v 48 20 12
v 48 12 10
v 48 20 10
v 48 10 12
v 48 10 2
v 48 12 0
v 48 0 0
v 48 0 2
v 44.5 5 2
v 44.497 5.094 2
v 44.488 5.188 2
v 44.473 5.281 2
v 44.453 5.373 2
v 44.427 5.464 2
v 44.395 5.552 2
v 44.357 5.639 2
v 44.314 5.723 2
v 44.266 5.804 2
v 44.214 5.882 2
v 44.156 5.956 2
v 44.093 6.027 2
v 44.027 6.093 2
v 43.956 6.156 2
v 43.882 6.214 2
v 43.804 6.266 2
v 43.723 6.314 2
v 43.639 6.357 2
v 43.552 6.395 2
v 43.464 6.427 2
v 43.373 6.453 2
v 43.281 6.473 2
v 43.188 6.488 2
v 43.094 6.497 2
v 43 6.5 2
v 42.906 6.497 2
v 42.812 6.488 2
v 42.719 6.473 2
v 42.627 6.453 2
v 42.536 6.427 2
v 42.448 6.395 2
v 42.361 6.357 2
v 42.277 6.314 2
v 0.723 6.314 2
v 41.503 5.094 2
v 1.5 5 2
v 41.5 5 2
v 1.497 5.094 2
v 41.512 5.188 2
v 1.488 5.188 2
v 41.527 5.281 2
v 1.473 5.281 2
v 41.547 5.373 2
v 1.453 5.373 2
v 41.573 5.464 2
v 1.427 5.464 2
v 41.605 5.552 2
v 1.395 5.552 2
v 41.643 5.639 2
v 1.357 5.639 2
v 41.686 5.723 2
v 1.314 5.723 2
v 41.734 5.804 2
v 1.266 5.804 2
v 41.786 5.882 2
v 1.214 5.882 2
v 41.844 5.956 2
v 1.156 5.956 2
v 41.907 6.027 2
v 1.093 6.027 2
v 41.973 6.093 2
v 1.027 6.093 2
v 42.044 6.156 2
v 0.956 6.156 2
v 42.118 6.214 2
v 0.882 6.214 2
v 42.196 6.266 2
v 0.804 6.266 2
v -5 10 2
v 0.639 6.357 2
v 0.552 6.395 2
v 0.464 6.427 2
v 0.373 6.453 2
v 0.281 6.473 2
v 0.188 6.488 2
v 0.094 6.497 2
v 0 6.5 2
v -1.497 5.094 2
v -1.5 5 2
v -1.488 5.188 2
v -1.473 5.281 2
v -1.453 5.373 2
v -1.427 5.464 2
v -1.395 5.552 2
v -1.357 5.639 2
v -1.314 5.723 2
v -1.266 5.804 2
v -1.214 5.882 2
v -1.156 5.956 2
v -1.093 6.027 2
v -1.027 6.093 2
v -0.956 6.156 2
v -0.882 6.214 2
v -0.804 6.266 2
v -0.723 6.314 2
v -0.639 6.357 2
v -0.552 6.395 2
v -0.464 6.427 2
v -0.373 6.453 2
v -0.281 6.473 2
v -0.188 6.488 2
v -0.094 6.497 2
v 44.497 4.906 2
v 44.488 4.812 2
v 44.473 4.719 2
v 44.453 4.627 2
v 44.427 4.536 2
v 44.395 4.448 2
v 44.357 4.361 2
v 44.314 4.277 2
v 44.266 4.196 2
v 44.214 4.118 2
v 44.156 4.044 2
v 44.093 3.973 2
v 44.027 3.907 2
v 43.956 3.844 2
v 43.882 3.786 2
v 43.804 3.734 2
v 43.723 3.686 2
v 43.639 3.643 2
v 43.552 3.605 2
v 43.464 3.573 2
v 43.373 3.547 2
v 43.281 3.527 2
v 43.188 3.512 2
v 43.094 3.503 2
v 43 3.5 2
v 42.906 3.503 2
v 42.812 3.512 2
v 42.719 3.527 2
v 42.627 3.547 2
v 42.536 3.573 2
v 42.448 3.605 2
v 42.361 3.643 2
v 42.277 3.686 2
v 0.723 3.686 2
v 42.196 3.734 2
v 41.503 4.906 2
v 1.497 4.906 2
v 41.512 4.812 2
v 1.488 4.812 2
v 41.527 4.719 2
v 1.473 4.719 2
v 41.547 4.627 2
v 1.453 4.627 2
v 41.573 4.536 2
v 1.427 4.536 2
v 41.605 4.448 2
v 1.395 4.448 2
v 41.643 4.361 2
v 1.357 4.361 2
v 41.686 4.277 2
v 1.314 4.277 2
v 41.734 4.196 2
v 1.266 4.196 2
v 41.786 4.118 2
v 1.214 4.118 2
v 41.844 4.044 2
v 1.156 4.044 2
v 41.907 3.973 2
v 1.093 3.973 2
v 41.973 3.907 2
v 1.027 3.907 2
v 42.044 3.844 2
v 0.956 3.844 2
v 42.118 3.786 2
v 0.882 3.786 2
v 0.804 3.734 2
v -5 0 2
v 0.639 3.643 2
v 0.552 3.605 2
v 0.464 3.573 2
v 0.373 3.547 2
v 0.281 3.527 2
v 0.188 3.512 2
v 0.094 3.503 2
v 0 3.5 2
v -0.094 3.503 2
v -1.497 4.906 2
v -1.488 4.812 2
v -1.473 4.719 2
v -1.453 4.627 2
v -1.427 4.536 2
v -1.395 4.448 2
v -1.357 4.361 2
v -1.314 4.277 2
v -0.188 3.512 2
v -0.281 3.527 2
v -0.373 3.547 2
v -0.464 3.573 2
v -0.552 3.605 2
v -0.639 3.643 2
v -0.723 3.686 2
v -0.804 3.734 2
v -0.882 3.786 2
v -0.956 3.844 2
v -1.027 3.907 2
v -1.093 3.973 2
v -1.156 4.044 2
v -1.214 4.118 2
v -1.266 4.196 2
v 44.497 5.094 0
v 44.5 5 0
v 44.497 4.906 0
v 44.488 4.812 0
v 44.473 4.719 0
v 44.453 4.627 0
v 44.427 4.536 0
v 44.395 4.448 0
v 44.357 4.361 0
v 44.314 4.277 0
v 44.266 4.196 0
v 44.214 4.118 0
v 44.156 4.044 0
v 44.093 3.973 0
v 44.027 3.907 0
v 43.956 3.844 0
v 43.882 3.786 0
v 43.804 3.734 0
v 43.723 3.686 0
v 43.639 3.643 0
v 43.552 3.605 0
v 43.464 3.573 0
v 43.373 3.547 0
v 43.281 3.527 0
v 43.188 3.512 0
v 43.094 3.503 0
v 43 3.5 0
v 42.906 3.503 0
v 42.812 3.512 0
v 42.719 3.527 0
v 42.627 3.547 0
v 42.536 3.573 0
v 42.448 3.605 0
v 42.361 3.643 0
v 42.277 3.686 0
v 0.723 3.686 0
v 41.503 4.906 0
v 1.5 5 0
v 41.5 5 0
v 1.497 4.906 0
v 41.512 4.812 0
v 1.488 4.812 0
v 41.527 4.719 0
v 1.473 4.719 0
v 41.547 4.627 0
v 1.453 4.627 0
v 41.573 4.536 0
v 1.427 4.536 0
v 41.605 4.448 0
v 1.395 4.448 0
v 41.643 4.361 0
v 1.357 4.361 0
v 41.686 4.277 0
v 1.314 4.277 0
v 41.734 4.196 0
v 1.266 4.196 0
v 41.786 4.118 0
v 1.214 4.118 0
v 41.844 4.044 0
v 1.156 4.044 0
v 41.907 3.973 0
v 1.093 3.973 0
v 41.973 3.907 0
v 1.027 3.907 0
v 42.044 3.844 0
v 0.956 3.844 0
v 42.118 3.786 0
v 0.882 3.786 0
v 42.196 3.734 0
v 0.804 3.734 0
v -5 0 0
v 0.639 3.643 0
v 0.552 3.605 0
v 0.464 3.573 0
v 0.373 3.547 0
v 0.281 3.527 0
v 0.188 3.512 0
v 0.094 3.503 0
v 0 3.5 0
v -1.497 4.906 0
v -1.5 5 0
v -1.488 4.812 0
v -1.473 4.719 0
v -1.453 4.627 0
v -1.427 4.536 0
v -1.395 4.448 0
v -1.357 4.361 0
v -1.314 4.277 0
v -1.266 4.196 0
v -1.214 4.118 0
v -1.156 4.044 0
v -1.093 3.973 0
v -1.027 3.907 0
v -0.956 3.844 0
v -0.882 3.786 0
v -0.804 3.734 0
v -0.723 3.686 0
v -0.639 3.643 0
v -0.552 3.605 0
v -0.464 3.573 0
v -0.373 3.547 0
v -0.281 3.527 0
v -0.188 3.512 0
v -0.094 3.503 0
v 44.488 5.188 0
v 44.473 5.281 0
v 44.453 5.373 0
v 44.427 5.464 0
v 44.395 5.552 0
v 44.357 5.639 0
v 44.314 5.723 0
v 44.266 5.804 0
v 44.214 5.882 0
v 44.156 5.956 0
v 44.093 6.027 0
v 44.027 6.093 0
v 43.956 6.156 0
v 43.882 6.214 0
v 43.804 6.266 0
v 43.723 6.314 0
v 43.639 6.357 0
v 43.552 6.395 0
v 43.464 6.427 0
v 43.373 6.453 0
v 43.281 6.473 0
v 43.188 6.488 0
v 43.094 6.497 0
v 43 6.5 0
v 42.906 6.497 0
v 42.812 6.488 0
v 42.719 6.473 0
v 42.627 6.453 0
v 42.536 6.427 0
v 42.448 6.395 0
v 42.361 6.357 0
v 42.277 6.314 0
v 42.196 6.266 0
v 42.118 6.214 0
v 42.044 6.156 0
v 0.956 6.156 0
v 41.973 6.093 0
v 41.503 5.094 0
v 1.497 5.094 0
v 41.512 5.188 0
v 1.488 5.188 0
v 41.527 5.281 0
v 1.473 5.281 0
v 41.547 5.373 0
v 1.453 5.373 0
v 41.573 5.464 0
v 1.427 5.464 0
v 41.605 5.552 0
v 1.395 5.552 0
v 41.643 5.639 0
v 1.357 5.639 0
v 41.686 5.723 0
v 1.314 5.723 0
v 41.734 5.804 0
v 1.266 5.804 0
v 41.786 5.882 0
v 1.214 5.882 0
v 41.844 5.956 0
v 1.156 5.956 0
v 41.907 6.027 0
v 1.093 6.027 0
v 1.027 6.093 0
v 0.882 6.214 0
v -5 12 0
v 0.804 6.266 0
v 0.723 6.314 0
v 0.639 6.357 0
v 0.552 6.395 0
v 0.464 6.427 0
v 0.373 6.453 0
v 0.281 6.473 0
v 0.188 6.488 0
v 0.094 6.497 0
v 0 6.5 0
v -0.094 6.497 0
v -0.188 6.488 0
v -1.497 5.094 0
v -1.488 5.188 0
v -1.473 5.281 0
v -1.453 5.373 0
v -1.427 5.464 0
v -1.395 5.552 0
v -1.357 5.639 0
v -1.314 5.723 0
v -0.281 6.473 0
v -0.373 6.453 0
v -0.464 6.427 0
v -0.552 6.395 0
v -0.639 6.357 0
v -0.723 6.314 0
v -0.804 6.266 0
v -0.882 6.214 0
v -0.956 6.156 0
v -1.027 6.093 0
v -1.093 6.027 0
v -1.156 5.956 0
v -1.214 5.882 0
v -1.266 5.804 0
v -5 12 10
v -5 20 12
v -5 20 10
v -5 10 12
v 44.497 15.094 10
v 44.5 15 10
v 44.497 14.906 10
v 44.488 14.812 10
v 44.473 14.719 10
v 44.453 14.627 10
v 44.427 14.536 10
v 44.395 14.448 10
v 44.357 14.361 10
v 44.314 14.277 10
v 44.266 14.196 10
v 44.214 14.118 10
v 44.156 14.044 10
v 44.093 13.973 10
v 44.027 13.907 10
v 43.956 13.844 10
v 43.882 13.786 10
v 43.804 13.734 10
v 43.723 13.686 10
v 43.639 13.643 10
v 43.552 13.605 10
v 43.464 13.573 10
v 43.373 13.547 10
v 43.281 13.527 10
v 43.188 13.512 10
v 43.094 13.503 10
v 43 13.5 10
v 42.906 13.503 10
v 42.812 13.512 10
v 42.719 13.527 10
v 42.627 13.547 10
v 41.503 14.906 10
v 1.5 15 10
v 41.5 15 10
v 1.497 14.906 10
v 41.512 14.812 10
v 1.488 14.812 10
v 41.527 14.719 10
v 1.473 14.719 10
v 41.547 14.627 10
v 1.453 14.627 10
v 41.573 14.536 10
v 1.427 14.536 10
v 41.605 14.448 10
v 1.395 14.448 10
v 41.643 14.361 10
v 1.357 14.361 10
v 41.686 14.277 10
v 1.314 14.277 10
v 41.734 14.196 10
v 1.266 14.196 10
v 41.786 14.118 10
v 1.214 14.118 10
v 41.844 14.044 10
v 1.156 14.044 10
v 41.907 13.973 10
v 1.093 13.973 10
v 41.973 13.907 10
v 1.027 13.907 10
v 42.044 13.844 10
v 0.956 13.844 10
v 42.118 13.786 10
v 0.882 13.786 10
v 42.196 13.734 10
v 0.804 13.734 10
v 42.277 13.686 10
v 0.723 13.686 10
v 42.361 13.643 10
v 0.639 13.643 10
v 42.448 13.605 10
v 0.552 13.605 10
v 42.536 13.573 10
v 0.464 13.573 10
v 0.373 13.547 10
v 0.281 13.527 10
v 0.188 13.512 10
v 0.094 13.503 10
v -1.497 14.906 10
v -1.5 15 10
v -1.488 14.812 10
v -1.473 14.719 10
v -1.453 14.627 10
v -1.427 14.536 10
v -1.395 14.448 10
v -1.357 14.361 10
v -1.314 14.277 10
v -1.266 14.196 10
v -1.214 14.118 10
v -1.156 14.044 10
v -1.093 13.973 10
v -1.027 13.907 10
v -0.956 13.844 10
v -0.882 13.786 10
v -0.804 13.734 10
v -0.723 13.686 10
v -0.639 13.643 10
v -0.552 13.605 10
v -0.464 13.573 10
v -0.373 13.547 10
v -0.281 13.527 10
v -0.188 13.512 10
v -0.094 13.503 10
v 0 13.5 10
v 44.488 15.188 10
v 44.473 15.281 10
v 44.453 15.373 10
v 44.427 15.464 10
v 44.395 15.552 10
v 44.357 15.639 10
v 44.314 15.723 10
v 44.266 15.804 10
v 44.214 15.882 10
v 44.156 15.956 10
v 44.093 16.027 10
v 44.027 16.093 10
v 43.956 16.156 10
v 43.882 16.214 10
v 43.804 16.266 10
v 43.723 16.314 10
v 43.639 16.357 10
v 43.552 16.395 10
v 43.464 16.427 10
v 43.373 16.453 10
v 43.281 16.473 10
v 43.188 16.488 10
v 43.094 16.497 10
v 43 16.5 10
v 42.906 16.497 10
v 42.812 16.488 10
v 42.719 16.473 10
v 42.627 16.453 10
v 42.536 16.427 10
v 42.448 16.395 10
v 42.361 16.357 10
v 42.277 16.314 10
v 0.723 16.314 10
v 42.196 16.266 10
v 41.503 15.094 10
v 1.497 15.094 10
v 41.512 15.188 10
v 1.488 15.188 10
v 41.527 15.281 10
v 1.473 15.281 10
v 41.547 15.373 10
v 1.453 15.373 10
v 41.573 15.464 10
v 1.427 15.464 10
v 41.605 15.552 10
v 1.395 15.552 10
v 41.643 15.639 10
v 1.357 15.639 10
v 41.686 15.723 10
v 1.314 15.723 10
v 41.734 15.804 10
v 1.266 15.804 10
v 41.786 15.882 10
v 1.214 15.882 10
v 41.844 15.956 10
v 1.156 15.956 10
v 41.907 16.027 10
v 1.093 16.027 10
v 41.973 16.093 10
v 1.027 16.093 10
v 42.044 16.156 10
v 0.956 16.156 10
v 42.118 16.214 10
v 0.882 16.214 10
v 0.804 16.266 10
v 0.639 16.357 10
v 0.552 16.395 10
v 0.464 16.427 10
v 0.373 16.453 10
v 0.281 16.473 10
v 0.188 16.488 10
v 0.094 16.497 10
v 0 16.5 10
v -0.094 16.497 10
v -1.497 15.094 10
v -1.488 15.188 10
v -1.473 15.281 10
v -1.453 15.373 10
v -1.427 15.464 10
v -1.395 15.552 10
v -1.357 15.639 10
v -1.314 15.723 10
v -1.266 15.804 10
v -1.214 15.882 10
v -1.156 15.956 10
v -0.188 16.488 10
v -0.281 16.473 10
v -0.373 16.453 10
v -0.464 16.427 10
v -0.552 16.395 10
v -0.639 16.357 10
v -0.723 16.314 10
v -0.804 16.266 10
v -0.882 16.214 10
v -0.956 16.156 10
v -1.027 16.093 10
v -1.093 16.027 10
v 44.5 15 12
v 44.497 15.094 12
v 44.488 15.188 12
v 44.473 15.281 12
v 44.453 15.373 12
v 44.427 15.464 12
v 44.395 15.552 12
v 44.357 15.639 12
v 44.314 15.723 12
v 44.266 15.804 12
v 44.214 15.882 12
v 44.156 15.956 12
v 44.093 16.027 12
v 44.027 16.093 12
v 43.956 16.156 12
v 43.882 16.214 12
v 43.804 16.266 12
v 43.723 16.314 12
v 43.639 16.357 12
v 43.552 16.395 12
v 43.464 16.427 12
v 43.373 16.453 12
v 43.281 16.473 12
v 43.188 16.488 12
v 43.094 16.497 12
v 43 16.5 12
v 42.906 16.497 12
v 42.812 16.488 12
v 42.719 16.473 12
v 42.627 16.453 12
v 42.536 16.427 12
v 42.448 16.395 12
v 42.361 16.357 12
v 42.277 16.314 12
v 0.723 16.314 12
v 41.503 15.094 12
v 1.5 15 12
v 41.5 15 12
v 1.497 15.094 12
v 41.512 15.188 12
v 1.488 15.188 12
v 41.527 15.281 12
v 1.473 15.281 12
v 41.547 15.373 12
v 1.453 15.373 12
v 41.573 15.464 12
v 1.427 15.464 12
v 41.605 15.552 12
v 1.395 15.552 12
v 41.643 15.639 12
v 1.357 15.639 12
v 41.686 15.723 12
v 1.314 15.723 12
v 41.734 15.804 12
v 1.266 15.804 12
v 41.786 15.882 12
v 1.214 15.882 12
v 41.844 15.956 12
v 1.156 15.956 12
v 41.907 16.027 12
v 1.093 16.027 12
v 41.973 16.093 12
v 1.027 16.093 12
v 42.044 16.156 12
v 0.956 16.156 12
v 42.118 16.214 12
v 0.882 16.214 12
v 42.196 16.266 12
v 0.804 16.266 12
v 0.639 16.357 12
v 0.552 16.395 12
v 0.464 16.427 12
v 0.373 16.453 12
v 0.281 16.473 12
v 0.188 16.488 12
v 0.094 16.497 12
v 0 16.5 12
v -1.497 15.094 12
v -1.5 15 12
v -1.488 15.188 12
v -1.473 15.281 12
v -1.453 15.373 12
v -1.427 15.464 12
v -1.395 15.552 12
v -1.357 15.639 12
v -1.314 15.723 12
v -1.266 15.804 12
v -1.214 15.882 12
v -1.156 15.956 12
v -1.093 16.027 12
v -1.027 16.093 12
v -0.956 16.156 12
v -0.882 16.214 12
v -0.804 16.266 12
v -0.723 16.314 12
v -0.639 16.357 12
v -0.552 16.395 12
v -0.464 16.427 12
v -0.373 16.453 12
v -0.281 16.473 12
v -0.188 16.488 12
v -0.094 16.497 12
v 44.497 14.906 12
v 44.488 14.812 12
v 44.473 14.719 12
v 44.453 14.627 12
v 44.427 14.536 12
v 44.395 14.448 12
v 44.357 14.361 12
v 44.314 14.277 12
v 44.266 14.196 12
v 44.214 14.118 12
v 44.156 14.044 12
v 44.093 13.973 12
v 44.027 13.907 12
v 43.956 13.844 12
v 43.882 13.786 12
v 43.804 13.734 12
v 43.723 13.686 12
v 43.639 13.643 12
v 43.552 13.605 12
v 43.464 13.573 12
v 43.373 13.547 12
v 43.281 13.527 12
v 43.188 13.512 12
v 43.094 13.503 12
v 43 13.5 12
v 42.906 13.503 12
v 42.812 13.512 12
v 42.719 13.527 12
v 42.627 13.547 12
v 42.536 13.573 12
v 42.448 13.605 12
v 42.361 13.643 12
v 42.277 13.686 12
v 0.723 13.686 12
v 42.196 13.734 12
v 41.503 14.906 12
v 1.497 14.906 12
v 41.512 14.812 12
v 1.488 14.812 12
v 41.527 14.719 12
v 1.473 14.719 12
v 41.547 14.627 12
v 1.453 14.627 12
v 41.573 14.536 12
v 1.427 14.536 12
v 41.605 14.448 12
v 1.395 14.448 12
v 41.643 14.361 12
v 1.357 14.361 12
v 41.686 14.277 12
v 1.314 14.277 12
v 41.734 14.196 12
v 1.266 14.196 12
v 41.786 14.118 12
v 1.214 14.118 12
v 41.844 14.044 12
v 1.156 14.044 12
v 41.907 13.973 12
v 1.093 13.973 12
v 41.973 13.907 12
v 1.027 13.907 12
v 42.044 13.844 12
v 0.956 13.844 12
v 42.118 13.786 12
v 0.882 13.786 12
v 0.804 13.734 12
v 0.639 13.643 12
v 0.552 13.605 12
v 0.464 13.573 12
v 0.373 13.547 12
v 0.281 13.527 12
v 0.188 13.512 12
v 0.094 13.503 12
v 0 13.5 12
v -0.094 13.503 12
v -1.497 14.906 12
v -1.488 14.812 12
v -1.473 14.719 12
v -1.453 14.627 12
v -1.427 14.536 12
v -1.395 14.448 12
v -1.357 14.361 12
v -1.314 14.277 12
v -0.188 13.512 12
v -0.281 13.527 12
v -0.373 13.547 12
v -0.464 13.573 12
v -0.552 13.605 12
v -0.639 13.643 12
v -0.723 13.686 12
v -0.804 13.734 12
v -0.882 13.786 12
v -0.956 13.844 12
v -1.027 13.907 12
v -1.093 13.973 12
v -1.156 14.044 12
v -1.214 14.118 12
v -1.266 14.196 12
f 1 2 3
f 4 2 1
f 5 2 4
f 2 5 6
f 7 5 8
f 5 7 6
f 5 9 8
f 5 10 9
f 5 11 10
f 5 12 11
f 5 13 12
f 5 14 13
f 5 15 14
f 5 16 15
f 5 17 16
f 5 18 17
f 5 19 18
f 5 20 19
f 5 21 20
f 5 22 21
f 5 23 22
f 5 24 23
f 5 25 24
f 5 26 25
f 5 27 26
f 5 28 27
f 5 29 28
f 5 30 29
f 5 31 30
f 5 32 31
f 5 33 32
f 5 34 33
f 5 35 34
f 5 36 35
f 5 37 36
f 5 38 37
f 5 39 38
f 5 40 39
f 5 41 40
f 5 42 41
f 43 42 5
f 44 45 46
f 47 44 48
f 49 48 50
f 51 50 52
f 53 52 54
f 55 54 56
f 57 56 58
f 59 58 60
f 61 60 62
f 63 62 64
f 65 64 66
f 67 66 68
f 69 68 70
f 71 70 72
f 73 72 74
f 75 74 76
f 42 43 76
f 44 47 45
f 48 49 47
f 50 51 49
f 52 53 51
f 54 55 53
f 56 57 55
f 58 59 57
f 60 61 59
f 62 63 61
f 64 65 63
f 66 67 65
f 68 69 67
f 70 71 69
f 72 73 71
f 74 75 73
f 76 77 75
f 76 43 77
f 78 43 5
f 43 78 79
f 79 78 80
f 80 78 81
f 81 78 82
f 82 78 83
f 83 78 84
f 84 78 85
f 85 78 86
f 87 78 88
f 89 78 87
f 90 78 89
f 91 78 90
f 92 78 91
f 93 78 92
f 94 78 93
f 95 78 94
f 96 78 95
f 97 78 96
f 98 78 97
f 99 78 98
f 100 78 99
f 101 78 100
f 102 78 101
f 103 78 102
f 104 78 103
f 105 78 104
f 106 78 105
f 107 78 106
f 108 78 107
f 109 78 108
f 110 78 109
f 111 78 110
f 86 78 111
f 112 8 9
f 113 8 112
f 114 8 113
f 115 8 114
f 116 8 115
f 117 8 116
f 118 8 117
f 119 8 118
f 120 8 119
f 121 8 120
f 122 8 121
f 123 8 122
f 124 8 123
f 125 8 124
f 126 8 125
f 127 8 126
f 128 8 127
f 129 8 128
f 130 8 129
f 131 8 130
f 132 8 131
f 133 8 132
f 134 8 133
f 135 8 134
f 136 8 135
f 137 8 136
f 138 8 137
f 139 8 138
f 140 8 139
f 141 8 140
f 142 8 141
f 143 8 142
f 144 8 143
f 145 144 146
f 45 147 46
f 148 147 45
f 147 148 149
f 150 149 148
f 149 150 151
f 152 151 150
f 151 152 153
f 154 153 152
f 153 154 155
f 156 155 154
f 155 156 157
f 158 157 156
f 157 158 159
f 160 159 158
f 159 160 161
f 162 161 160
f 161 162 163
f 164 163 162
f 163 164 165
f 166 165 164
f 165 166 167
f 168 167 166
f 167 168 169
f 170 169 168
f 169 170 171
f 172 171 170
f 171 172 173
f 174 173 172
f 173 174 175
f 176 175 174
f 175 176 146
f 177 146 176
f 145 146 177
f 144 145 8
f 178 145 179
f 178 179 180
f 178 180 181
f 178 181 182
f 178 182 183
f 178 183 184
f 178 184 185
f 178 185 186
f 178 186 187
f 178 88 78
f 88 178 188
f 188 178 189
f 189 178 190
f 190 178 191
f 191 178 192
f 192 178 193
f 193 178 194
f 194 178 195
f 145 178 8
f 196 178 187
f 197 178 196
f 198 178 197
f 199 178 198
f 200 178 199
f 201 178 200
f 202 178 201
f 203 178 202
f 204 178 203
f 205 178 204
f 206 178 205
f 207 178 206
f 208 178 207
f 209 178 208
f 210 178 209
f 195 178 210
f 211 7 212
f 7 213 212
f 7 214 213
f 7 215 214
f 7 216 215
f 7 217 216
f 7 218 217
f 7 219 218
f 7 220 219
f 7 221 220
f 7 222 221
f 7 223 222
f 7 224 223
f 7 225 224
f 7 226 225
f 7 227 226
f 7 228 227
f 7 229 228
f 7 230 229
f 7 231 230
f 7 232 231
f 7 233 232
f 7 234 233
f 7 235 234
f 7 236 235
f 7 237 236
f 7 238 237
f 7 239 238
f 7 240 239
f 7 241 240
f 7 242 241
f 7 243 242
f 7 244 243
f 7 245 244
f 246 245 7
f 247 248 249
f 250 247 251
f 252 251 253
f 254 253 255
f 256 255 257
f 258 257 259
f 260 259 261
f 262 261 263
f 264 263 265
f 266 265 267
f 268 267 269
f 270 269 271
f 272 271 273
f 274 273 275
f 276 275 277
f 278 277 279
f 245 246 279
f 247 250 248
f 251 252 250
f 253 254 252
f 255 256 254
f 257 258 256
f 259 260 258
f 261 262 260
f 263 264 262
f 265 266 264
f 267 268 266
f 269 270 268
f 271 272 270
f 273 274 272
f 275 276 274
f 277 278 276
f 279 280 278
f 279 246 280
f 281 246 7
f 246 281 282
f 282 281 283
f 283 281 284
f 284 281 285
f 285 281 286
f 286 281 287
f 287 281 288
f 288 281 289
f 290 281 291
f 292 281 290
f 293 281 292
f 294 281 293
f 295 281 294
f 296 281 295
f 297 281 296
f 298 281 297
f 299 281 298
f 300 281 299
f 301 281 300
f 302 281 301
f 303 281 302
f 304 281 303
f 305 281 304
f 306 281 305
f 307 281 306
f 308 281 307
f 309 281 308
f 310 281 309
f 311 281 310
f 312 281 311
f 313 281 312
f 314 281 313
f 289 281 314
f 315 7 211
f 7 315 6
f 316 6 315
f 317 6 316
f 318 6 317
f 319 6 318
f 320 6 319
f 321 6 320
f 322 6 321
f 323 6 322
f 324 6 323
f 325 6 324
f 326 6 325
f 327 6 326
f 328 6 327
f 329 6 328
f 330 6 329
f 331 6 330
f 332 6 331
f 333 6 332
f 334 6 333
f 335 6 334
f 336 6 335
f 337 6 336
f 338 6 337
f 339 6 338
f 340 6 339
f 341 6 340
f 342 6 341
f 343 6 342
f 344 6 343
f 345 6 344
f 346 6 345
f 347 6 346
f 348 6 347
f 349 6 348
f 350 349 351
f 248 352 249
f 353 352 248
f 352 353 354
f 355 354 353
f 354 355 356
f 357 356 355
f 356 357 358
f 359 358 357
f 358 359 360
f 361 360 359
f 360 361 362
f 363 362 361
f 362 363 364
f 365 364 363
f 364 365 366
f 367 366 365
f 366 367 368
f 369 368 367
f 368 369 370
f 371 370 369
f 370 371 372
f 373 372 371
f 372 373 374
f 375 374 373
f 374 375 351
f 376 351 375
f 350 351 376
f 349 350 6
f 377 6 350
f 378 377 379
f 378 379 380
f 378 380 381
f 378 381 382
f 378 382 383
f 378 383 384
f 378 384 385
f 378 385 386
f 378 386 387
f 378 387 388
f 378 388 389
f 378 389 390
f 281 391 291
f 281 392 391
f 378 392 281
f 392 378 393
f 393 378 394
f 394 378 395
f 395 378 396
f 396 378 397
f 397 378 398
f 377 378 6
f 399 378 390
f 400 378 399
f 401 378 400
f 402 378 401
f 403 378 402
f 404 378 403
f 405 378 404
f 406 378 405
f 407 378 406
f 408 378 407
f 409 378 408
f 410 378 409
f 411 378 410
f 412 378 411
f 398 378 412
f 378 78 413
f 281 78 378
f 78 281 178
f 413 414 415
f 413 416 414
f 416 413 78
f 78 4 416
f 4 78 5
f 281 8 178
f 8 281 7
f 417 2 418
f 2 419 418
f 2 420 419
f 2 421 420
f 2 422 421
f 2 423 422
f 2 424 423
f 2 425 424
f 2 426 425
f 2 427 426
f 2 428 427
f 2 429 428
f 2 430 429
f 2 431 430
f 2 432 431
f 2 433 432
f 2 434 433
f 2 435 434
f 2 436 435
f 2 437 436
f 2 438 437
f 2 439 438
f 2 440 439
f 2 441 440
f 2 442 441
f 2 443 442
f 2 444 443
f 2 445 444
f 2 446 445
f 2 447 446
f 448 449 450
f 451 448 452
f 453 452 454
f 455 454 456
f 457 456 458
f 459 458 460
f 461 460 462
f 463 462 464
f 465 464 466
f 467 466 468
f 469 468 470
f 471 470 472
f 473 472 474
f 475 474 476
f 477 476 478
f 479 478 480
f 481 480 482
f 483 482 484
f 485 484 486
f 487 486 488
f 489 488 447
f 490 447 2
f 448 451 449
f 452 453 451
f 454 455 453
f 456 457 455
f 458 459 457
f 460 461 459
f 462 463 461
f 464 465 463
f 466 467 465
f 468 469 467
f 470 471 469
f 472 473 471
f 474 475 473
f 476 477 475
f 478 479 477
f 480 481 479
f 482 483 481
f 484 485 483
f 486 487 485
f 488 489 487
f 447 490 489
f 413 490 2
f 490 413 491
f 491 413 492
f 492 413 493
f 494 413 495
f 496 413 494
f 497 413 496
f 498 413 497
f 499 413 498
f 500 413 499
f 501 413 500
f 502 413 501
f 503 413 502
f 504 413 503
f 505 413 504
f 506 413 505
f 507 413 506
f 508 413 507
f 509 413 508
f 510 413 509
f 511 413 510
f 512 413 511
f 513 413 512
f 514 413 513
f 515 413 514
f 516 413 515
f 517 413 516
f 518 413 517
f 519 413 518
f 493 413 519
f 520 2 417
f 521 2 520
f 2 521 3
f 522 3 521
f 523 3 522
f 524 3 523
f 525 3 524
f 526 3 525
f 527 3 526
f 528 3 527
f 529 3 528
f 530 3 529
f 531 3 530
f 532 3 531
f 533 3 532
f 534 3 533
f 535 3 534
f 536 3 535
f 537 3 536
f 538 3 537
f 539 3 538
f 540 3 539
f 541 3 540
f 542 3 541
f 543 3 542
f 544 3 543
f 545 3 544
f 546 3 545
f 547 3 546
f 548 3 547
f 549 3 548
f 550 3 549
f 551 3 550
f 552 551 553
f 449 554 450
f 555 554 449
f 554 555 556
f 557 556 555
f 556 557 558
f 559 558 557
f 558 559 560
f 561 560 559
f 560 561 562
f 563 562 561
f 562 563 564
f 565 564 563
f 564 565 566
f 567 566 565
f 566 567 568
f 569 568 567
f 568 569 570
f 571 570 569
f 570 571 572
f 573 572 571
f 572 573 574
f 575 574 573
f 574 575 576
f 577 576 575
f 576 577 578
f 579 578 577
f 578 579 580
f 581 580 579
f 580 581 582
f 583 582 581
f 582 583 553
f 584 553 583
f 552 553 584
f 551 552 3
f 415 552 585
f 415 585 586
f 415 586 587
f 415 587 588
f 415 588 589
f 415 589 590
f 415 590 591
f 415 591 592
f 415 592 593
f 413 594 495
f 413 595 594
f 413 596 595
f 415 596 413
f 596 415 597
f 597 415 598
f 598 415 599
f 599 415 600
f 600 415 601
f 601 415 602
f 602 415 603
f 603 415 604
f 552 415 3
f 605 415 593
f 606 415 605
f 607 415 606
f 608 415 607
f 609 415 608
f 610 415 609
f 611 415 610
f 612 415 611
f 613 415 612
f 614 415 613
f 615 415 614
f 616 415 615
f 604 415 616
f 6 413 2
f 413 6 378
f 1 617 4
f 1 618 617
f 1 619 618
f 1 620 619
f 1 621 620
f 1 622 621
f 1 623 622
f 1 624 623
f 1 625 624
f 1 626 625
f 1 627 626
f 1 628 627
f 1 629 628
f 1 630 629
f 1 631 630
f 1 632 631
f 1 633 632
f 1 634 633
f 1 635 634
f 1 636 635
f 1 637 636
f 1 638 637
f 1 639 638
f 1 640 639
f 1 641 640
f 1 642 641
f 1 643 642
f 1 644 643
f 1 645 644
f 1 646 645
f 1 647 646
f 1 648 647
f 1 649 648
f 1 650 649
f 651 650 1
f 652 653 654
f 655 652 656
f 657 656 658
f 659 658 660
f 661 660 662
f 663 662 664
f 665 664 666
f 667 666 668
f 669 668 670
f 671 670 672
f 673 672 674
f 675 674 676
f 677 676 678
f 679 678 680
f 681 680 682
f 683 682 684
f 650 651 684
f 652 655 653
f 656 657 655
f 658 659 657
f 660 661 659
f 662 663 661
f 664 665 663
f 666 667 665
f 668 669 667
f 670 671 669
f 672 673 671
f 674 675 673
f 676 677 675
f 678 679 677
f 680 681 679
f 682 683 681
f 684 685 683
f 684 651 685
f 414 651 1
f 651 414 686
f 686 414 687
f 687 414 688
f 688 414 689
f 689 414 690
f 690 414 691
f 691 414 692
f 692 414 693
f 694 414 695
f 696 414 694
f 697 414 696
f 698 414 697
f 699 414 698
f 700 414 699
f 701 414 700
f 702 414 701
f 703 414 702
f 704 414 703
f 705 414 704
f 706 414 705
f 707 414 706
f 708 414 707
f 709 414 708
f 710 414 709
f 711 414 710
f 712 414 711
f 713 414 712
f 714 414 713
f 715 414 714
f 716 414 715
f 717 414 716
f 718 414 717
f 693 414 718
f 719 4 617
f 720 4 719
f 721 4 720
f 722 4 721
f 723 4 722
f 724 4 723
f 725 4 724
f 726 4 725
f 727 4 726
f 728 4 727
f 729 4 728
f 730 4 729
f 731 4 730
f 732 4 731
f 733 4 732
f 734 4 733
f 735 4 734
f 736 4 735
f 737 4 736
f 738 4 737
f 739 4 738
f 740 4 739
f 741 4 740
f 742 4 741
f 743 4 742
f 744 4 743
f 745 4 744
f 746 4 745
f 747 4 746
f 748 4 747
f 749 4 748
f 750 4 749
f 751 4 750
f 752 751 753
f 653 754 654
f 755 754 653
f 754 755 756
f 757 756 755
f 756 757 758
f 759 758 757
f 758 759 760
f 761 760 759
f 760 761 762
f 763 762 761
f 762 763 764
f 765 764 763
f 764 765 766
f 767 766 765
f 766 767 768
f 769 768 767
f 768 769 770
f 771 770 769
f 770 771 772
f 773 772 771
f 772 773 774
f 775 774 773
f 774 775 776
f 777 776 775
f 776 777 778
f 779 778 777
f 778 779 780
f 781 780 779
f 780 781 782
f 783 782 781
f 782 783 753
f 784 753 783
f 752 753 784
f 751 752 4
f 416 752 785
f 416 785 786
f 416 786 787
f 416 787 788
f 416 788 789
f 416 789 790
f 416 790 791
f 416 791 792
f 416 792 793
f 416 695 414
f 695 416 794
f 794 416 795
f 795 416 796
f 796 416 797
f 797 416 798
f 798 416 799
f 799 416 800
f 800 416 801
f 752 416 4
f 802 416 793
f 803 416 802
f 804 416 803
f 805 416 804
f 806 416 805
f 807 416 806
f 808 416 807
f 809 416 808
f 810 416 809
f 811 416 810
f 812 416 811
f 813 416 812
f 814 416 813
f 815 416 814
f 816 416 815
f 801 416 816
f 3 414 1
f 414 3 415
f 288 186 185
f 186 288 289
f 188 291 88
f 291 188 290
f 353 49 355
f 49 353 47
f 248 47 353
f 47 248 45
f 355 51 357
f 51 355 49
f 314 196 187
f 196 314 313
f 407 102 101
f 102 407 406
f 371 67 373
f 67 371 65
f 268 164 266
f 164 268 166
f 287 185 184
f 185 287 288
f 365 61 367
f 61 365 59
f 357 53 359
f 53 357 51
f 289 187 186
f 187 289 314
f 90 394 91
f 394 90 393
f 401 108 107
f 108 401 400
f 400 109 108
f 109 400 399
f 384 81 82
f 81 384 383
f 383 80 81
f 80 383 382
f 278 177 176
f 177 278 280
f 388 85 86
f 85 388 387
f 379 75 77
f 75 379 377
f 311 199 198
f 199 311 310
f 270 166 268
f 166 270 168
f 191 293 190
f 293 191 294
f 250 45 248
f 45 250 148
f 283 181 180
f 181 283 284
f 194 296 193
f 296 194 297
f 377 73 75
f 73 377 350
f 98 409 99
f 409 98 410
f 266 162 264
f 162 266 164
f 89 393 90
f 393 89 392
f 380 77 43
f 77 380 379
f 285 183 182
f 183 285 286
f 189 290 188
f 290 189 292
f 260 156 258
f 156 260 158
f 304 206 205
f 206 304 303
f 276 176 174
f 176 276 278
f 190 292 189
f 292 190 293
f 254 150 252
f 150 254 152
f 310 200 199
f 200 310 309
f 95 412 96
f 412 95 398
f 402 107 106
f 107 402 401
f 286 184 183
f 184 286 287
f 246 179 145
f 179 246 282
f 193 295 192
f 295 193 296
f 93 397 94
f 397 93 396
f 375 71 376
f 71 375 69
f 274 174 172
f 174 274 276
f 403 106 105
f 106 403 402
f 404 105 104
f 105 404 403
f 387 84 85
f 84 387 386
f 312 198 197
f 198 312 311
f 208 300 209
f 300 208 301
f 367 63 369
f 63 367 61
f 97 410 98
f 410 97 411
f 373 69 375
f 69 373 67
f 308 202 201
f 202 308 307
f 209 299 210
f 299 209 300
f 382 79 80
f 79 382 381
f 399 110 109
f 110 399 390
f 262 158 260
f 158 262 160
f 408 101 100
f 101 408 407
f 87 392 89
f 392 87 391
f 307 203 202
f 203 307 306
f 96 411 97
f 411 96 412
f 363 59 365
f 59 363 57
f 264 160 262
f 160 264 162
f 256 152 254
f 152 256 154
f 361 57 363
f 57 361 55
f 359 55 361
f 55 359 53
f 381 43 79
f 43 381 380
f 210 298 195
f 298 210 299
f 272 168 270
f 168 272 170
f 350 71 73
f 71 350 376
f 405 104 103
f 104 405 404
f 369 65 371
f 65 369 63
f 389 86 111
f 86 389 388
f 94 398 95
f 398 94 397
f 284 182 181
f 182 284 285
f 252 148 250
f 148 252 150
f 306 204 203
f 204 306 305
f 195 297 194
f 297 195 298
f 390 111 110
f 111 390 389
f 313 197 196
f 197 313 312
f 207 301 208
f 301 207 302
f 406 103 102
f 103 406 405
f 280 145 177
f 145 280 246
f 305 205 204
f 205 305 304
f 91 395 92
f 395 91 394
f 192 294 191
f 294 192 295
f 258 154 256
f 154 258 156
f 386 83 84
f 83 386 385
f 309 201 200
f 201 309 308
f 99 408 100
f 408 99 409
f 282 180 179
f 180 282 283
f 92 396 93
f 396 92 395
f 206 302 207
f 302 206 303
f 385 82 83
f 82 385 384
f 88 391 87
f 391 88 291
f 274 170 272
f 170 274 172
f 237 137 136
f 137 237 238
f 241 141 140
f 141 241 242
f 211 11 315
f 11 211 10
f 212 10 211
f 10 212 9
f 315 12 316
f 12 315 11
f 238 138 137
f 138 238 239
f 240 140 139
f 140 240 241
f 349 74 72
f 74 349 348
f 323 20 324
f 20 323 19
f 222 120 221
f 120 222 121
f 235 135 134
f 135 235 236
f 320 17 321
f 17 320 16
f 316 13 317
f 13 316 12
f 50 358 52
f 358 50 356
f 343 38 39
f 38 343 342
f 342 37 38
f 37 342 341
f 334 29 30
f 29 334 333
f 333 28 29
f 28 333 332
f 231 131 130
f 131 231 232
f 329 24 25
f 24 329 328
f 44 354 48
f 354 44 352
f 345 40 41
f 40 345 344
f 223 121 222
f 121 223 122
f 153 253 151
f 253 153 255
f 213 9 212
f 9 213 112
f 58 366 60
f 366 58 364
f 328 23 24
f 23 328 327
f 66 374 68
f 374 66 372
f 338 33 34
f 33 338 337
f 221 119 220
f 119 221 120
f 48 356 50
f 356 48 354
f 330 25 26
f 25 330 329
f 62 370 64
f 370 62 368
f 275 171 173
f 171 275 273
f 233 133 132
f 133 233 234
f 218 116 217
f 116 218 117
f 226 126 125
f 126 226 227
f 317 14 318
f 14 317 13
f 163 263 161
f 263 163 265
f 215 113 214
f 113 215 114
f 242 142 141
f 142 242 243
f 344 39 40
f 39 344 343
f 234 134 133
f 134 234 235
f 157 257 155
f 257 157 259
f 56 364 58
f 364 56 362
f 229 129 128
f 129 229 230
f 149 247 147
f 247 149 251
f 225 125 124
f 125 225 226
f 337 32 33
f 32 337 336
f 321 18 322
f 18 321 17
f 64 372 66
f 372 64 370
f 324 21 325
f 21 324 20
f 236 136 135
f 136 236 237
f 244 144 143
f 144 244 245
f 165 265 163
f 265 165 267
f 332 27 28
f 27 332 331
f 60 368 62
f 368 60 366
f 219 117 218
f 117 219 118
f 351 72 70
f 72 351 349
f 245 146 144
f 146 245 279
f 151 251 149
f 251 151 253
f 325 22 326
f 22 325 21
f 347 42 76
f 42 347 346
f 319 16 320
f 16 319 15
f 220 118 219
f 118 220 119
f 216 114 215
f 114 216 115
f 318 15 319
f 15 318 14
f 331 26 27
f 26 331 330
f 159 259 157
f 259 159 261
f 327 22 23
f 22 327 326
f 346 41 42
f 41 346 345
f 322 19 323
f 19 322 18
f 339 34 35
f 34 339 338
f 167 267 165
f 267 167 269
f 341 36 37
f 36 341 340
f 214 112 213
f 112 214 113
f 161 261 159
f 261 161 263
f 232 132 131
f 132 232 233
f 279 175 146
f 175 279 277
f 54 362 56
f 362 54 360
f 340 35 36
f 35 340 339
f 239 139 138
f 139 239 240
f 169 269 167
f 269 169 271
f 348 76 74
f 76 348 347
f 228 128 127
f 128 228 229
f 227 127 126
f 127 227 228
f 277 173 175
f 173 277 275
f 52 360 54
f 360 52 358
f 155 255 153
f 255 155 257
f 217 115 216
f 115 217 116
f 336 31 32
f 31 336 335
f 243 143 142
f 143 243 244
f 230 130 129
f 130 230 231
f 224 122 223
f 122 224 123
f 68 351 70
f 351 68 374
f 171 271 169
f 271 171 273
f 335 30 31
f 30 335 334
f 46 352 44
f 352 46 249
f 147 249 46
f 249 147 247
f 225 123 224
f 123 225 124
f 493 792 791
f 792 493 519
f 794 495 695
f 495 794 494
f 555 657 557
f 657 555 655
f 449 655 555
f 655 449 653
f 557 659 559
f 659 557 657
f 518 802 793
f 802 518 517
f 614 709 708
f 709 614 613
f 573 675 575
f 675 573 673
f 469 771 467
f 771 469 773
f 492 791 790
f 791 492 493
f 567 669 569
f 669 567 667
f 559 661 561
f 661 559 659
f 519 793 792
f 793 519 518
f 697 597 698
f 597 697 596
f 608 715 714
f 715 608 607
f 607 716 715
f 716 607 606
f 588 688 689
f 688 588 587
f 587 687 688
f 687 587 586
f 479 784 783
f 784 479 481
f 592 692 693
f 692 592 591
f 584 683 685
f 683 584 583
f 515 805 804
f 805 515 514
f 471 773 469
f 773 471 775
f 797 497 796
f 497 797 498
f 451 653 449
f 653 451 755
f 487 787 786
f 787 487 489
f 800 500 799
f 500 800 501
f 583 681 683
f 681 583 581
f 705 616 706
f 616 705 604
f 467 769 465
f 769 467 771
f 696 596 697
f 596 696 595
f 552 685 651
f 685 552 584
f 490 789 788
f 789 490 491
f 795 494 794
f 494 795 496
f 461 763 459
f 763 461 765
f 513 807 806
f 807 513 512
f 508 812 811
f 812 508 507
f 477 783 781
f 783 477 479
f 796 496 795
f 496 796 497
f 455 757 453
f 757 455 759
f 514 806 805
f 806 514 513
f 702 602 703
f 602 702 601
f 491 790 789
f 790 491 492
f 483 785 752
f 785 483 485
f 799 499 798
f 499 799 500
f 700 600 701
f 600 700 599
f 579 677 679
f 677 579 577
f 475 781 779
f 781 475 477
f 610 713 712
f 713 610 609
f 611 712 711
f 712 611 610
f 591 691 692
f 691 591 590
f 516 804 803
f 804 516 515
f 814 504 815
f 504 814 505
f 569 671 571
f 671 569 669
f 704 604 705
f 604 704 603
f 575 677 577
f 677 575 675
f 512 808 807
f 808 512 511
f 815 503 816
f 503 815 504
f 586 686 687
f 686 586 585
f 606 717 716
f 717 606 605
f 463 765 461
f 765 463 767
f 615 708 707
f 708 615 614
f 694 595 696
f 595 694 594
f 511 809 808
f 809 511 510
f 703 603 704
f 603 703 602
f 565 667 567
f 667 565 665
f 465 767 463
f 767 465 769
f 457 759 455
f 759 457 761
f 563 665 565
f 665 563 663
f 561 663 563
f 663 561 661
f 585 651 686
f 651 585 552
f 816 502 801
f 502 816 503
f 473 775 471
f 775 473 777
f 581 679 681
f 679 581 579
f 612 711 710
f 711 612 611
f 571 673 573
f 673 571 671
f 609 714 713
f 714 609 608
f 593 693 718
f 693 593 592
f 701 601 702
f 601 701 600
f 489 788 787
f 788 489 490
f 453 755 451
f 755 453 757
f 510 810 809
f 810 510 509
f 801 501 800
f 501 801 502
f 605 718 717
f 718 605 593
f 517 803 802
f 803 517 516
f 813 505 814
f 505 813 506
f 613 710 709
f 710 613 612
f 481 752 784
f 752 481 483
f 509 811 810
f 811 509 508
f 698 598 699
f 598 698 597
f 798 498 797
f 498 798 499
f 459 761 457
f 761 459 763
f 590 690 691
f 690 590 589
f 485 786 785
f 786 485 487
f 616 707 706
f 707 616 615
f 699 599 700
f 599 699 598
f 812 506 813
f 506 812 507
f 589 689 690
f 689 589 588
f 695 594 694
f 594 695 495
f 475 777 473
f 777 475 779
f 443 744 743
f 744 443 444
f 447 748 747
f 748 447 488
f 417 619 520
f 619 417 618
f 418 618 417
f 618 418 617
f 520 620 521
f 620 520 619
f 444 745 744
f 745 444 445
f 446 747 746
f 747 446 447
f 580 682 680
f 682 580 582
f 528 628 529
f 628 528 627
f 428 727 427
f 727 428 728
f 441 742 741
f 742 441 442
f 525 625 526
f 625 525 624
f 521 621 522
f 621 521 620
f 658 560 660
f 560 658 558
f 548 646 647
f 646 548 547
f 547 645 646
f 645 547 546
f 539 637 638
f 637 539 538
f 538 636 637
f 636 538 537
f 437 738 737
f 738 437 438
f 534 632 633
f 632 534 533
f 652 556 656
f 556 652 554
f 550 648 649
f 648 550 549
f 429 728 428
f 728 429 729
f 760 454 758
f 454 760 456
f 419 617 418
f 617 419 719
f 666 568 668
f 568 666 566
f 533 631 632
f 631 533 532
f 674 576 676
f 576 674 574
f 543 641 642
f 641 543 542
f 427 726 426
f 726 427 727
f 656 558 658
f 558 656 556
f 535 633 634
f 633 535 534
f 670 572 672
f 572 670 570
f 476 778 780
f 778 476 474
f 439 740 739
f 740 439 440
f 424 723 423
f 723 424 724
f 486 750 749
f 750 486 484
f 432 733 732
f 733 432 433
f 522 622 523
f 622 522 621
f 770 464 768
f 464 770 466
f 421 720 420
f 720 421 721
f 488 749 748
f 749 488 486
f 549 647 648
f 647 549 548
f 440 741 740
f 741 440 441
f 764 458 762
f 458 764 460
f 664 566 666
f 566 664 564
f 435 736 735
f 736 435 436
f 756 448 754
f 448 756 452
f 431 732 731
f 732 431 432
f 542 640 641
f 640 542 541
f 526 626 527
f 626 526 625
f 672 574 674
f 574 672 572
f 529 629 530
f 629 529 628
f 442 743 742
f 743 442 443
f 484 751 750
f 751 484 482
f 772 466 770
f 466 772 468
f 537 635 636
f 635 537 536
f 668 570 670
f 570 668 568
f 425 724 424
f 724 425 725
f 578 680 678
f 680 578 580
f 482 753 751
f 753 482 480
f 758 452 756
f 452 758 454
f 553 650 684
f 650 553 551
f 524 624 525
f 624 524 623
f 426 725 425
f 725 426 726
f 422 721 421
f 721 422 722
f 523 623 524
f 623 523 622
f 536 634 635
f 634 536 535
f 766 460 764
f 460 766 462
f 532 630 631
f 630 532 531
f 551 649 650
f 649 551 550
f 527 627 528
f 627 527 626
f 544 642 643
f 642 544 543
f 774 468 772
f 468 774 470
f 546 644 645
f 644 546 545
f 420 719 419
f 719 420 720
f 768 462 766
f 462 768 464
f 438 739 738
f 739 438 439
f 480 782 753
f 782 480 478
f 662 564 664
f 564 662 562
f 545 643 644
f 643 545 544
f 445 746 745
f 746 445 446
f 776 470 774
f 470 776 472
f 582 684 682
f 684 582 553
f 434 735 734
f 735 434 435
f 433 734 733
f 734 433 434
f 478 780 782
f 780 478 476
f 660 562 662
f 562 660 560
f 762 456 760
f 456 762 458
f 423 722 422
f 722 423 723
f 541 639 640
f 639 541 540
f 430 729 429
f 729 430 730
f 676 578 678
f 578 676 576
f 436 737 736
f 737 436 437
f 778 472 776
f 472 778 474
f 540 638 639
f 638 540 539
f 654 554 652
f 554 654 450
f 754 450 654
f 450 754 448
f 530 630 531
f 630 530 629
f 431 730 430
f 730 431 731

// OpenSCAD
difference(){
	union(){



        translate([-5,0,0]){
           cube([53,10,2], center=false);
        }        
        translate([-5,10,0]){
           cube([53,2,10], center=false);
        }        
        translate([-5,10,10]){
           cube([53,10,2], center=false);
        }        




        
	}
	union() {
        translate([0,5,-1]){
            rotate([0,0,0]){
               cylinder(h=999, r=1.5, $fn=100, center=false);
            }
        }
        translate([43,5,-1]){
            rotate([0,0,0]){
               cylinder(h=999, r=1.5, $fn=100, center=false);
            }
        }
        translate([0,15,-1]){
            rotate([0,0,0]){
               cylinder(h=999, r=1.5, $fn=100, center=false);
            }
        }
        translate([43,15,-1]){
            rotate([0,0,0]){
               cylinder(h=999, r=1.5, $fn=100, center=false);
            }
        }

	}
}
